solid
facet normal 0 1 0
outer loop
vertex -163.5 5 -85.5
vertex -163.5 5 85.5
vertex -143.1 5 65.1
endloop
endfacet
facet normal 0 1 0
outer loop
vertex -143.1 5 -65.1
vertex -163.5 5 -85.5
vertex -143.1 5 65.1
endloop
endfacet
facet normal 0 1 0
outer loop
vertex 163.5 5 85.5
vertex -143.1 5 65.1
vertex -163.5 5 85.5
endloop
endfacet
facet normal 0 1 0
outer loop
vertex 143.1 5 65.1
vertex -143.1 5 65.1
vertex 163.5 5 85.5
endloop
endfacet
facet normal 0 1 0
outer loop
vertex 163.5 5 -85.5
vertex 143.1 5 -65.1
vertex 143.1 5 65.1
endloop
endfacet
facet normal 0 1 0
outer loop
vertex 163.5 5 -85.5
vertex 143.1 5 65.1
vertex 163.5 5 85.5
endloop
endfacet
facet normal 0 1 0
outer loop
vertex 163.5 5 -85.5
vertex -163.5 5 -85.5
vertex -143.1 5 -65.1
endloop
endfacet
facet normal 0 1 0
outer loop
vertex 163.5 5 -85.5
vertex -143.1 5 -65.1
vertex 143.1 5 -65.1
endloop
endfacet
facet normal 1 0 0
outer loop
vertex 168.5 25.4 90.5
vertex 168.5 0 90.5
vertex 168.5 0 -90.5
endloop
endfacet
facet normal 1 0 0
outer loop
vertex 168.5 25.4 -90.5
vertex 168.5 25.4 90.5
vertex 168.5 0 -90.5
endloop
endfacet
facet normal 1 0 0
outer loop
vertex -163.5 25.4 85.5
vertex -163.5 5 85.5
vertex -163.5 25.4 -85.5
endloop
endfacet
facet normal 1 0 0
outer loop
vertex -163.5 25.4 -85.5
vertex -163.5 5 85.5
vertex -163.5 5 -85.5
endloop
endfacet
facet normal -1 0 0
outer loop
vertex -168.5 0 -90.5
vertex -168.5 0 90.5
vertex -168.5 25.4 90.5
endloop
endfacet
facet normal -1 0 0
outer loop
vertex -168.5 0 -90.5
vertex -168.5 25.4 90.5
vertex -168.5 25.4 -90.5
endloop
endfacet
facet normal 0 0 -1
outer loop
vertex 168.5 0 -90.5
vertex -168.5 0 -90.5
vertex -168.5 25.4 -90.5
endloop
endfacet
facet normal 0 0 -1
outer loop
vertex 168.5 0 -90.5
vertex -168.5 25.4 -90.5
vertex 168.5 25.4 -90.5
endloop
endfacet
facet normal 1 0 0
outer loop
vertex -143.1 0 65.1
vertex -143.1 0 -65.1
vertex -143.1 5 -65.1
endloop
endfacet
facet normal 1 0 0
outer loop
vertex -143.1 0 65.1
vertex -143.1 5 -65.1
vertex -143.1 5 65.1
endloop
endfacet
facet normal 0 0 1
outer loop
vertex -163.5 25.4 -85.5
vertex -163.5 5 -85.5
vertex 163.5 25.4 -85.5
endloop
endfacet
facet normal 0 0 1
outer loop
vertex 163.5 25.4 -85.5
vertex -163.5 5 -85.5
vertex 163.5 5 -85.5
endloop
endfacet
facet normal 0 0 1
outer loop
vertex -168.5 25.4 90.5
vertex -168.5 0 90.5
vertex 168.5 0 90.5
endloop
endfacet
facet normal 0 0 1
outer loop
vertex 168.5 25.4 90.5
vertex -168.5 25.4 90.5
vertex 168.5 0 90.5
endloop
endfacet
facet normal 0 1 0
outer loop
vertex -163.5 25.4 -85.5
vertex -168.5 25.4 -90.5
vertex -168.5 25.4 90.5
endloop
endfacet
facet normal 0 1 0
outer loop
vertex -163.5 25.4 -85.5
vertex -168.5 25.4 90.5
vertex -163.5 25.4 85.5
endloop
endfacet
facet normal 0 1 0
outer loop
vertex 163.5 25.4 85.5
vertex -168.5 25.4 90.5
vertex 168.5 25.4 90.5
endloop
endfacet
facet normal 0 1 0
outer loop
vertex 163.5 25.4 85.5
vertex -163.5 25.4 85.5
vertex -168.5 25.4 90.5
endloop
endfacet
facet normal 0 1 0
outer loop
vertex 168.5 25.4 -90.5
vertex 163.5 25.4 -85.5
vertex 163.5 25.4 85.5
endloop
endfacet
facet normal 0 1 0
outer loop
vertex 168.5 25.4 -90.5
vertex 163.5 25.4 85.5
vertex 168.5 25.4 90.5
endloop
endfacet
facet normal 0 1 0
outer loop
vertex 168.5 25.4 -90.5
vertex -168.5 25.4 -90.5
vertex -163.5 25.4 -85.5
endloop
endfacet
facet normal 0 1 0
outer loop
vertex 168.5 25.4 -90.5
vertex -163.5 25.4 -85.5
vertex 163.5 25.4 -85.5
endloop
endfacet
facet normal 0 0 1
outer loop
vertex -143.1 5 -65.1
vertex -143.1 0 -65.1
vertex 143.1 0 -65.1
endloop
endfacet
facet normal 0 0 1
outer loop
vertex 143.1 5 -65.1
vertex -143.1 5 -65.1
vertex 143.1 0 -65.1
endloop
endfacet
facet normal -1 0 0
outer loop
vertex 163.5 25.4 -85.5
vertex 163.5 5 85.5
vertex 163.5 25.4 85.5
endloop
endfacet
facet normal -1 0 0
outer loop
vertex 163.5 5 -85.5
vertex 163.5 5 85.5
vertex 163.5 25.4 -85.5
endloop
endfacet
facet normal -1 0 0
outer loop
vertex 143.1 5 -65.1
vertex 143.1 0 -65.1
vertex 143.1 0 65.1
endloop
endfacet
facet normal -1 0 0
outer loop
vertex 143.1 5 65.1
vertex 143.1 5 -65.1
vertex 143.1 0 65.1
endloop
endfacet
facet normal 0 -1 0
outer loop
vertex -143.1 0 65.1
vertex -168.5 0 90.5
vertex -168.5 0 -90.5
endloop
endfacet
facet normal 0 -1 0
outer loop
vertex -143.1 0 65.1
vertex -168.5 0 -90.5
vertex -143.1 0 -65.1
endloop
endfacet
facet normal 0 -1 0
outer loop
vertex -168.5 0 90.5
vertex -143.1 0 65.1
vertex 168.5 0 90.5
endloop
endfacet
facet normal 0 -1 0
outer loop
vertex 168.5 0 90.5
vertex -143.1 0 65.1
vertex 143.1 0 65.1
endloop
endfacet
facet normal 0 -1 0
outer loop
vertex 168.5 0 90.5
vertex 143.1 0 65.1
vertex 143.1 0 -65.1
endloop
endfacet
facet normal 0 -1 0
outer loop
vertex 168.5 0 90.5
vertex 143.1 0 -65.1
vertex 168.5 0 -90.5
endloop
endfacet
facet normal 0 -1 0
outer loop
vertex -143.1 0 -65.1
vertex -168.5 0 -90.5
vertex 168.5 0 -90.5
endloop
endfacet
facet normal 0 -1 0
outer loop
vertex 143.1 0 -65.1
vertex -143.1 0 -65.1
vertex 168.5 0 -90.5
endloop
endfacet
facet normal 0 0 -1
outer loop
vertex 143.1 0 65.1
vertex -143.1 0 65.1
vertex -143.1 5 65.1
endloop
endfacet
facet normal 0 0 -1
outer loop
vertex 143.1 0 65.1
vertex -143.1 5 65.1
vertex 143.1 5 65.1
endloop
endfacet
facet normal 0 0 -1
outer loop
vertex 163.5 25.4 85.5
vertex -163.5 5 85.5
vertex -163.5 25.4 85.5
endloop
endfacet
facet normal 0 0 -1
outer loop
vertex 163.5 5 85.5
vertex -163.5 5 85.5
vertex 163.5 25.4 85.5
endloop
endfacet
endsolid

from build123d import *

# Parameters (mm, degrees)
SKETCH1_W           = 337
SKETCH1_H           = 181
BOSS_EXTRUDE1_DEPTH = 25.4
SHELL1_T            = -5
SKETCH2_W           = 286.2
SKETCH2_H           = 130.2
CUT_EXTRUDE1_DEPTH  = 193.944707105


with BuildPart() as part:
    # Sketch1 → Boss-Extrude1 (new body)
    with BuildSketch(Plane(origin=(0, 0, 0), x_dir=(1, 0, 0), z_dir=(0, 1, 0))):
        Rectangle(SKETCH1_W, SKETCH1_H)
    extrude(amount=BOSS_EXTRUDE1_DEPTH)

    # Shell1
    shell1_openings = [part.faces().sort_by_distance(p)[0] for p in [
        (0, 25.4, 0),
    ]]
    offset(amount=SHELL1_T, openings=shell1_openings, kind=Kind.INTERSECTION)

    # Sketch2 → Cut-Extrude1 (cut, through all)
    with BuildSketch(Plane.XZ):
        Rectangle(SKETCH2_W, SKETCH2_H)
    extrude(amount=-CUT_EXTRUDE1_DEPTH, mode=Mode.SUBTRACT)


solid = part.part
